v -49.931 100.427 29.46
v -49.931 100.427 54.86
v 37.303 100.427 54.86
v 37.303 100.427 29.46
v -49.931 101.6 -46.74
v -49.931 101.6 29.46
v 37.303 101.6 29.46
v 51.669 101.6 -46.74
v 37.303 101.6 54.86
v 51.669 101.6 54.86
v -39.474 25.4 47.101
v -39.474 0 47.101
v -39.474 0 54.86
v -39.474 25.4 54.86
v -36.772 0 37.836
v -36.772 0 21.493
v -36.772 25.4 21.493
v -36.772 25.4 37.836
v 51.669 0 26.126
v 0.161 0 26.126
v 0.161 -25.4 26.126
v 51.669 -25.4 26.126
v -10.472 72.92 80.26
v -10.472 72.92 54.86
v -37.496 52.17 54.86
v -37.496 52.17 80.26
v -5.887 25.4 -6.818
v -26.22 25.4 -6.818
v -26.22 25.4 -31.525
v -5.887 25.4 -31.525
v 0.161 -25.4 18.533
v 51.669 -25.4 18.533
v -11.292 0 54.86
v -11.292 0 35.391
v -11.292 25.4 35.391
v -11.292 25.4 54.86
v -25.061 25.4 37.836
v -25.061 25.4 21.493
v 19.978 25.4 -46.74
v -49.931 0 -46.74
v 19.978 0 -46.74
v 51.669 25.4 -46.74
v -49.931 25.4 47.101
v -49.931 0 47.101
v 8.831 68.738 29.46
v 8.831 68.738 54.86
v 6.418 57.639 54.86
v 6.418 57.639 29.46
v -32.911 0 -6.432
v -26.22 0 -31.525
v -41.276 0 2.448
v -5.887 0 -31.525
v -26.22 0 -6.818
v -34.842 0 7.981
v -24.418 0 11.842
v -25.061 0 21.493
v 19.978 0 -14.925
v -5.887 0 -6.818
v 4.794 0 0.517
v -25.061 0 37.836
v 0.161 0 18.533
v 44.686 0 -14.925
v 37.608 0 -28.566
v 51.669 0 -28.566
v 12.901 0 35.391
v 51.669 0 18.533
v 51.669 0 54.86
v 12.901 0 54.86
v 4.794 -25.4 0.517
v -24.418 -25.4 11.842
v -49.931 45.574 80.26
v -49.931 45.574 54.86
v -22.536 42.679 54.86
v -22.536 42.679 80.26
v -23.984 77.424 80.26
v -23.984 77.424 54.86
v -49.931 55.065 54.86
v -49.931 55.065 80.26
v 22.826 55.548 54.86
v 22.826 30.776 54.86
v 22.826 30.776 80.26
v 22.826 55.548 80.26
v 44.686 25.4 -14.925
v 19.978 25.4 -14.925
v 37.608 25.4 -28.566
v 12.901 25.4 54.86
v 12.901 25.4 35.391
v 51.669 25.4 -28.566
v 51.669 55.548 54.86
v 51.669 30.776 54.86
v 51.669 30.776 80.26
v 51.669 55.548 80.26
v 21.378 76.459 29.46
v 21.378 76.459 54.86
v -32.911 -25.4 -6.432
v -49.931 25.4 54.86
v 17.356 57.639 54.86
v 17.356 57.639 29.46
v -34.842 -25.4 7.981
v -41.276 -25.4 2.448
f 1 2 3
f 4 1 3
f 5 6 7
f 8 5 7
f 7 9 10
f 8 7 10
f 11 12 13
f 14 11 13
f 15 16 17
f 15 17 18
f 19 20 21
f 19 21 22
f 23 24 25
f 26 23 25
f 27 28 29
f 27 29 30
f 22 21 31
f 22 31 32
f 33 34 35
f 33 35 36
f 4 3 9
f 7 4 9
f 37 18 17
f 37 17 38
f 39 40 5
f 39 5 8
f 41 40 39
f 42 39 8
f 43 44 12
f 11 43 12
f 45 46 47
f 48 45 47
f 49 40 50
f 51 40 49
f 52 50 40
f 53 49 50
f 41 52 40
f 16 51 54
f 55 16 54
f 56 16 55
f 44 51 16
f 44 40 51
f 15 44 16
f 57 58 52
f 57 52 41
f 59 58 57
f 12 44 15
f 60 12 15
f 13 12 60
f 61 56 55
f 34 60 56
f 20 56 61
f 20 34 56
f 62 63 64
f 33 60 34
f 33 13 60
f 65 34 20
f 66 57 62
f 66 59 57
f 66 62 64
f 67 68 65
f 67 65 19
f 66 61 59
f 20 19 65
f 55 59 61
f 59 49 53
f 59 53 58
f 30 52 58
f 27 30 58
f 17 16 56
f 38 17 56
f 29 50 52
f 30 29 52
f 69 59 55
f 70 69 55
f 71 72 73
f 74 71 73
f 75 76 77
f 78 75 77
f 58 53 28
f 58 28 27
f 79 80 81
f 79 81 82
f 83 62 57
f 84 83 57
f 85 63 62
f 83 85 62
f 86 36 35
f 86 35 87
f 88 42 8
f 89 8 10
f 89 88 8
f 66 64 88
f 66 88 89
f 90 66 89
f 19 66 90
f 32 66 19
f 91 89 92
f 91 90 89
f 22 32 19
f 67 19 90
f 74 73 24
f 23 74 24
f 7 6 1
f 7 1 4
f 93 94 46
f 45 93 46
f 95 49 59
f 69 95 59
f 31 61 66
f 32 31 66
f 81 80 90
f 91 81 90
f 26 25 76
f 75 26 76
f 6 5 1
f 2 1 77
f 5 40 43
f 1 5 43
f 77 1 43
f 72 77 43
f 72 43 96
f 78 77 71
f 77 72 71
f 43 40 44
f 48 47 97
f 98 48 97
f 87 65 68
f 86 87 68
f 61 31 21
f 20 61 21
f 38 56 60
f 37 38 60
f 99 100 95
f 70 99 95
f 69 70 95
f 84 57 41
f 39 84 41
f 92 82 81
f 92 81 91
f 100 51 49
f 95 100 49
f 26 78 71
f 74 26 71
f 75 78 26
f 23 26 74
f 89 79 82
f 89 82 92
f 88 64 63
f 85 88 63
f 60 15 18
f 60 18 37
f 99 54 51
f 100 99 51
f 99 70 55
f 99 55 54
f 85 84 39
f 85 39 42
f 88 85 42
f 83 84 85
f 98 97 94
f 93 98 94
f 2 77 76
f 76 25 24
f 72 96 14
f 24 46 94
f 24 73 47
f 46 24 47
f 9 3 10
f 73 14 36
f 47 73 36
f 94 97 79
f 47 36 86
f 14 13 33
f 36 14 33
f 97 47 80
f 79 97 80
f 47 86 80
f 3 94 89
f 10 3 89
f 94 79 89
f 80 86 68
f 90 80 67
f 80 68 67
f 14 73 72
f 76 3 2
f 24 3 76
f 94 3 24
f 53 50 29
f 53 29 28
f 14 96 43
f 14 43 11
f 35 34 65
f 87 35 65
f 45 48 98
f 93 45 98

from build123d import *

# Parameters (mm, degrees)
F0_W     = 101.6
F0_H     = 101.6
F1_DEPTH = 101.6
F2_W     = 10.4571996808
F2_H     = 7.7591115123
F2_W_2   = 24.1928109899
F2_H_2   = 19.4694609827
F2_W_3   = 11.7103494704
F2_H_3   = 16.3430143148
F2_W_4   = 20.3322558664
F2_H_4   = 24.7075520456
F3_DEPTH = 25.4
F2_W_5   = 51.507767962
F2_H_5   = 7.5924228877
F4_DEPTH = 25.4
F5_W     = 28.8430942774
F5_H     = 24.771893397
F6_DEPTH = 25.4
F5_W_2   = 87.2339873195
F5_H_2   = 1.1734974742
F7_DEPTH = 25.4


with BuildPart() as f1:
    # F0 (on Front) → F1 (new body)
    with BuildSketch(Plane.XZ):
        with Locations((0.8686259389, 4.0604042715)):
            Rectangle(F0_W, F0_H)
    extrude(amount=-F1_DEPTH)

    # F2 (on face) → F3 (cut)
    with BuildSketch(Plane.XZ):
        with Locations((-44.7027742207, 50.9808485153)):
            Rectangle(F2_W, F2_H)
        with Locations((0.8042831905, 45.1256737802)):
            Rectangle(F2_W_2, F2_H_2)
        with Locations((-30.9166107327, 29.6644521877)):
            Rectangle(F2_W_3, F2_H_3)
        with Locations((-16.0534728784, -19.1715676337)):
            Rectangle(F2_W_4, F2_H_4)
        Polygon((19.9783723801, -14.9249564856), (19.9783723801, -46.7395957285), (51.6686259389, -46.7395957285), (51.6686259389, -28.5655856133), (37.6082397997, -28.5655856133), (44.6859262884, -14.9249564856), align=None)
    extrude(amount=-F3_DEPTH, mode=Mode.SUBTRACT)

    # F2 (on face) → F4 (join)
    with BuildSketch(Plane.XZ):
        Polygon((-24.4180094451, 11.84155792), (-34.8415076733, 7.9810023308), (-41.2757657468, 2.447540639), (-32.9112298787, -6.4317355864), (4.7935228795, 0.5172632518), align=None)
        with Locations((25.9147419579, 22.3293984309)):
            Rectangle(F2_W_5, F2_H_5)
    extrude(amount=F4_DEPTH)

    # F5 (on face) → F6 (join)
    with BuildSketch(Plane.XY.offset(54.8604042715)):
        with Locations((37.2470788002, 43.1616036221)):
            Rectangle(F5_W, F5_H)
        Polygon((-23.9836964756, 77.4240270257), (-49.9313740611, 55.0649799407), (-49.9313740611, 45.5744490027), (-22.5359871984, 42.6790341735), (-10.4717537761, 72.9200467467), (-37.4956354499, 52.1695651114), align=None)
    extrude(amount=F6_DEPTH)

    # F5 (on face) → F7 (cut)
    with BuildSketch(Plane.XY.offset(54.8604042715)):
        with Locations((-6.3143804014, 101.0132512629)):
            Rectangle(F5_W_2, F5_H_2)
        Polygon((17.3564106226, 57.638682425), (21.3778242469, 76.4588862658), (8.8310204446, 68.7377750874), (6.418173667, 57.638682425), align=None)
    extrude(amount=-F7_DEPTH, mode=Mode.SUBTRACT)


solid = f1.part
